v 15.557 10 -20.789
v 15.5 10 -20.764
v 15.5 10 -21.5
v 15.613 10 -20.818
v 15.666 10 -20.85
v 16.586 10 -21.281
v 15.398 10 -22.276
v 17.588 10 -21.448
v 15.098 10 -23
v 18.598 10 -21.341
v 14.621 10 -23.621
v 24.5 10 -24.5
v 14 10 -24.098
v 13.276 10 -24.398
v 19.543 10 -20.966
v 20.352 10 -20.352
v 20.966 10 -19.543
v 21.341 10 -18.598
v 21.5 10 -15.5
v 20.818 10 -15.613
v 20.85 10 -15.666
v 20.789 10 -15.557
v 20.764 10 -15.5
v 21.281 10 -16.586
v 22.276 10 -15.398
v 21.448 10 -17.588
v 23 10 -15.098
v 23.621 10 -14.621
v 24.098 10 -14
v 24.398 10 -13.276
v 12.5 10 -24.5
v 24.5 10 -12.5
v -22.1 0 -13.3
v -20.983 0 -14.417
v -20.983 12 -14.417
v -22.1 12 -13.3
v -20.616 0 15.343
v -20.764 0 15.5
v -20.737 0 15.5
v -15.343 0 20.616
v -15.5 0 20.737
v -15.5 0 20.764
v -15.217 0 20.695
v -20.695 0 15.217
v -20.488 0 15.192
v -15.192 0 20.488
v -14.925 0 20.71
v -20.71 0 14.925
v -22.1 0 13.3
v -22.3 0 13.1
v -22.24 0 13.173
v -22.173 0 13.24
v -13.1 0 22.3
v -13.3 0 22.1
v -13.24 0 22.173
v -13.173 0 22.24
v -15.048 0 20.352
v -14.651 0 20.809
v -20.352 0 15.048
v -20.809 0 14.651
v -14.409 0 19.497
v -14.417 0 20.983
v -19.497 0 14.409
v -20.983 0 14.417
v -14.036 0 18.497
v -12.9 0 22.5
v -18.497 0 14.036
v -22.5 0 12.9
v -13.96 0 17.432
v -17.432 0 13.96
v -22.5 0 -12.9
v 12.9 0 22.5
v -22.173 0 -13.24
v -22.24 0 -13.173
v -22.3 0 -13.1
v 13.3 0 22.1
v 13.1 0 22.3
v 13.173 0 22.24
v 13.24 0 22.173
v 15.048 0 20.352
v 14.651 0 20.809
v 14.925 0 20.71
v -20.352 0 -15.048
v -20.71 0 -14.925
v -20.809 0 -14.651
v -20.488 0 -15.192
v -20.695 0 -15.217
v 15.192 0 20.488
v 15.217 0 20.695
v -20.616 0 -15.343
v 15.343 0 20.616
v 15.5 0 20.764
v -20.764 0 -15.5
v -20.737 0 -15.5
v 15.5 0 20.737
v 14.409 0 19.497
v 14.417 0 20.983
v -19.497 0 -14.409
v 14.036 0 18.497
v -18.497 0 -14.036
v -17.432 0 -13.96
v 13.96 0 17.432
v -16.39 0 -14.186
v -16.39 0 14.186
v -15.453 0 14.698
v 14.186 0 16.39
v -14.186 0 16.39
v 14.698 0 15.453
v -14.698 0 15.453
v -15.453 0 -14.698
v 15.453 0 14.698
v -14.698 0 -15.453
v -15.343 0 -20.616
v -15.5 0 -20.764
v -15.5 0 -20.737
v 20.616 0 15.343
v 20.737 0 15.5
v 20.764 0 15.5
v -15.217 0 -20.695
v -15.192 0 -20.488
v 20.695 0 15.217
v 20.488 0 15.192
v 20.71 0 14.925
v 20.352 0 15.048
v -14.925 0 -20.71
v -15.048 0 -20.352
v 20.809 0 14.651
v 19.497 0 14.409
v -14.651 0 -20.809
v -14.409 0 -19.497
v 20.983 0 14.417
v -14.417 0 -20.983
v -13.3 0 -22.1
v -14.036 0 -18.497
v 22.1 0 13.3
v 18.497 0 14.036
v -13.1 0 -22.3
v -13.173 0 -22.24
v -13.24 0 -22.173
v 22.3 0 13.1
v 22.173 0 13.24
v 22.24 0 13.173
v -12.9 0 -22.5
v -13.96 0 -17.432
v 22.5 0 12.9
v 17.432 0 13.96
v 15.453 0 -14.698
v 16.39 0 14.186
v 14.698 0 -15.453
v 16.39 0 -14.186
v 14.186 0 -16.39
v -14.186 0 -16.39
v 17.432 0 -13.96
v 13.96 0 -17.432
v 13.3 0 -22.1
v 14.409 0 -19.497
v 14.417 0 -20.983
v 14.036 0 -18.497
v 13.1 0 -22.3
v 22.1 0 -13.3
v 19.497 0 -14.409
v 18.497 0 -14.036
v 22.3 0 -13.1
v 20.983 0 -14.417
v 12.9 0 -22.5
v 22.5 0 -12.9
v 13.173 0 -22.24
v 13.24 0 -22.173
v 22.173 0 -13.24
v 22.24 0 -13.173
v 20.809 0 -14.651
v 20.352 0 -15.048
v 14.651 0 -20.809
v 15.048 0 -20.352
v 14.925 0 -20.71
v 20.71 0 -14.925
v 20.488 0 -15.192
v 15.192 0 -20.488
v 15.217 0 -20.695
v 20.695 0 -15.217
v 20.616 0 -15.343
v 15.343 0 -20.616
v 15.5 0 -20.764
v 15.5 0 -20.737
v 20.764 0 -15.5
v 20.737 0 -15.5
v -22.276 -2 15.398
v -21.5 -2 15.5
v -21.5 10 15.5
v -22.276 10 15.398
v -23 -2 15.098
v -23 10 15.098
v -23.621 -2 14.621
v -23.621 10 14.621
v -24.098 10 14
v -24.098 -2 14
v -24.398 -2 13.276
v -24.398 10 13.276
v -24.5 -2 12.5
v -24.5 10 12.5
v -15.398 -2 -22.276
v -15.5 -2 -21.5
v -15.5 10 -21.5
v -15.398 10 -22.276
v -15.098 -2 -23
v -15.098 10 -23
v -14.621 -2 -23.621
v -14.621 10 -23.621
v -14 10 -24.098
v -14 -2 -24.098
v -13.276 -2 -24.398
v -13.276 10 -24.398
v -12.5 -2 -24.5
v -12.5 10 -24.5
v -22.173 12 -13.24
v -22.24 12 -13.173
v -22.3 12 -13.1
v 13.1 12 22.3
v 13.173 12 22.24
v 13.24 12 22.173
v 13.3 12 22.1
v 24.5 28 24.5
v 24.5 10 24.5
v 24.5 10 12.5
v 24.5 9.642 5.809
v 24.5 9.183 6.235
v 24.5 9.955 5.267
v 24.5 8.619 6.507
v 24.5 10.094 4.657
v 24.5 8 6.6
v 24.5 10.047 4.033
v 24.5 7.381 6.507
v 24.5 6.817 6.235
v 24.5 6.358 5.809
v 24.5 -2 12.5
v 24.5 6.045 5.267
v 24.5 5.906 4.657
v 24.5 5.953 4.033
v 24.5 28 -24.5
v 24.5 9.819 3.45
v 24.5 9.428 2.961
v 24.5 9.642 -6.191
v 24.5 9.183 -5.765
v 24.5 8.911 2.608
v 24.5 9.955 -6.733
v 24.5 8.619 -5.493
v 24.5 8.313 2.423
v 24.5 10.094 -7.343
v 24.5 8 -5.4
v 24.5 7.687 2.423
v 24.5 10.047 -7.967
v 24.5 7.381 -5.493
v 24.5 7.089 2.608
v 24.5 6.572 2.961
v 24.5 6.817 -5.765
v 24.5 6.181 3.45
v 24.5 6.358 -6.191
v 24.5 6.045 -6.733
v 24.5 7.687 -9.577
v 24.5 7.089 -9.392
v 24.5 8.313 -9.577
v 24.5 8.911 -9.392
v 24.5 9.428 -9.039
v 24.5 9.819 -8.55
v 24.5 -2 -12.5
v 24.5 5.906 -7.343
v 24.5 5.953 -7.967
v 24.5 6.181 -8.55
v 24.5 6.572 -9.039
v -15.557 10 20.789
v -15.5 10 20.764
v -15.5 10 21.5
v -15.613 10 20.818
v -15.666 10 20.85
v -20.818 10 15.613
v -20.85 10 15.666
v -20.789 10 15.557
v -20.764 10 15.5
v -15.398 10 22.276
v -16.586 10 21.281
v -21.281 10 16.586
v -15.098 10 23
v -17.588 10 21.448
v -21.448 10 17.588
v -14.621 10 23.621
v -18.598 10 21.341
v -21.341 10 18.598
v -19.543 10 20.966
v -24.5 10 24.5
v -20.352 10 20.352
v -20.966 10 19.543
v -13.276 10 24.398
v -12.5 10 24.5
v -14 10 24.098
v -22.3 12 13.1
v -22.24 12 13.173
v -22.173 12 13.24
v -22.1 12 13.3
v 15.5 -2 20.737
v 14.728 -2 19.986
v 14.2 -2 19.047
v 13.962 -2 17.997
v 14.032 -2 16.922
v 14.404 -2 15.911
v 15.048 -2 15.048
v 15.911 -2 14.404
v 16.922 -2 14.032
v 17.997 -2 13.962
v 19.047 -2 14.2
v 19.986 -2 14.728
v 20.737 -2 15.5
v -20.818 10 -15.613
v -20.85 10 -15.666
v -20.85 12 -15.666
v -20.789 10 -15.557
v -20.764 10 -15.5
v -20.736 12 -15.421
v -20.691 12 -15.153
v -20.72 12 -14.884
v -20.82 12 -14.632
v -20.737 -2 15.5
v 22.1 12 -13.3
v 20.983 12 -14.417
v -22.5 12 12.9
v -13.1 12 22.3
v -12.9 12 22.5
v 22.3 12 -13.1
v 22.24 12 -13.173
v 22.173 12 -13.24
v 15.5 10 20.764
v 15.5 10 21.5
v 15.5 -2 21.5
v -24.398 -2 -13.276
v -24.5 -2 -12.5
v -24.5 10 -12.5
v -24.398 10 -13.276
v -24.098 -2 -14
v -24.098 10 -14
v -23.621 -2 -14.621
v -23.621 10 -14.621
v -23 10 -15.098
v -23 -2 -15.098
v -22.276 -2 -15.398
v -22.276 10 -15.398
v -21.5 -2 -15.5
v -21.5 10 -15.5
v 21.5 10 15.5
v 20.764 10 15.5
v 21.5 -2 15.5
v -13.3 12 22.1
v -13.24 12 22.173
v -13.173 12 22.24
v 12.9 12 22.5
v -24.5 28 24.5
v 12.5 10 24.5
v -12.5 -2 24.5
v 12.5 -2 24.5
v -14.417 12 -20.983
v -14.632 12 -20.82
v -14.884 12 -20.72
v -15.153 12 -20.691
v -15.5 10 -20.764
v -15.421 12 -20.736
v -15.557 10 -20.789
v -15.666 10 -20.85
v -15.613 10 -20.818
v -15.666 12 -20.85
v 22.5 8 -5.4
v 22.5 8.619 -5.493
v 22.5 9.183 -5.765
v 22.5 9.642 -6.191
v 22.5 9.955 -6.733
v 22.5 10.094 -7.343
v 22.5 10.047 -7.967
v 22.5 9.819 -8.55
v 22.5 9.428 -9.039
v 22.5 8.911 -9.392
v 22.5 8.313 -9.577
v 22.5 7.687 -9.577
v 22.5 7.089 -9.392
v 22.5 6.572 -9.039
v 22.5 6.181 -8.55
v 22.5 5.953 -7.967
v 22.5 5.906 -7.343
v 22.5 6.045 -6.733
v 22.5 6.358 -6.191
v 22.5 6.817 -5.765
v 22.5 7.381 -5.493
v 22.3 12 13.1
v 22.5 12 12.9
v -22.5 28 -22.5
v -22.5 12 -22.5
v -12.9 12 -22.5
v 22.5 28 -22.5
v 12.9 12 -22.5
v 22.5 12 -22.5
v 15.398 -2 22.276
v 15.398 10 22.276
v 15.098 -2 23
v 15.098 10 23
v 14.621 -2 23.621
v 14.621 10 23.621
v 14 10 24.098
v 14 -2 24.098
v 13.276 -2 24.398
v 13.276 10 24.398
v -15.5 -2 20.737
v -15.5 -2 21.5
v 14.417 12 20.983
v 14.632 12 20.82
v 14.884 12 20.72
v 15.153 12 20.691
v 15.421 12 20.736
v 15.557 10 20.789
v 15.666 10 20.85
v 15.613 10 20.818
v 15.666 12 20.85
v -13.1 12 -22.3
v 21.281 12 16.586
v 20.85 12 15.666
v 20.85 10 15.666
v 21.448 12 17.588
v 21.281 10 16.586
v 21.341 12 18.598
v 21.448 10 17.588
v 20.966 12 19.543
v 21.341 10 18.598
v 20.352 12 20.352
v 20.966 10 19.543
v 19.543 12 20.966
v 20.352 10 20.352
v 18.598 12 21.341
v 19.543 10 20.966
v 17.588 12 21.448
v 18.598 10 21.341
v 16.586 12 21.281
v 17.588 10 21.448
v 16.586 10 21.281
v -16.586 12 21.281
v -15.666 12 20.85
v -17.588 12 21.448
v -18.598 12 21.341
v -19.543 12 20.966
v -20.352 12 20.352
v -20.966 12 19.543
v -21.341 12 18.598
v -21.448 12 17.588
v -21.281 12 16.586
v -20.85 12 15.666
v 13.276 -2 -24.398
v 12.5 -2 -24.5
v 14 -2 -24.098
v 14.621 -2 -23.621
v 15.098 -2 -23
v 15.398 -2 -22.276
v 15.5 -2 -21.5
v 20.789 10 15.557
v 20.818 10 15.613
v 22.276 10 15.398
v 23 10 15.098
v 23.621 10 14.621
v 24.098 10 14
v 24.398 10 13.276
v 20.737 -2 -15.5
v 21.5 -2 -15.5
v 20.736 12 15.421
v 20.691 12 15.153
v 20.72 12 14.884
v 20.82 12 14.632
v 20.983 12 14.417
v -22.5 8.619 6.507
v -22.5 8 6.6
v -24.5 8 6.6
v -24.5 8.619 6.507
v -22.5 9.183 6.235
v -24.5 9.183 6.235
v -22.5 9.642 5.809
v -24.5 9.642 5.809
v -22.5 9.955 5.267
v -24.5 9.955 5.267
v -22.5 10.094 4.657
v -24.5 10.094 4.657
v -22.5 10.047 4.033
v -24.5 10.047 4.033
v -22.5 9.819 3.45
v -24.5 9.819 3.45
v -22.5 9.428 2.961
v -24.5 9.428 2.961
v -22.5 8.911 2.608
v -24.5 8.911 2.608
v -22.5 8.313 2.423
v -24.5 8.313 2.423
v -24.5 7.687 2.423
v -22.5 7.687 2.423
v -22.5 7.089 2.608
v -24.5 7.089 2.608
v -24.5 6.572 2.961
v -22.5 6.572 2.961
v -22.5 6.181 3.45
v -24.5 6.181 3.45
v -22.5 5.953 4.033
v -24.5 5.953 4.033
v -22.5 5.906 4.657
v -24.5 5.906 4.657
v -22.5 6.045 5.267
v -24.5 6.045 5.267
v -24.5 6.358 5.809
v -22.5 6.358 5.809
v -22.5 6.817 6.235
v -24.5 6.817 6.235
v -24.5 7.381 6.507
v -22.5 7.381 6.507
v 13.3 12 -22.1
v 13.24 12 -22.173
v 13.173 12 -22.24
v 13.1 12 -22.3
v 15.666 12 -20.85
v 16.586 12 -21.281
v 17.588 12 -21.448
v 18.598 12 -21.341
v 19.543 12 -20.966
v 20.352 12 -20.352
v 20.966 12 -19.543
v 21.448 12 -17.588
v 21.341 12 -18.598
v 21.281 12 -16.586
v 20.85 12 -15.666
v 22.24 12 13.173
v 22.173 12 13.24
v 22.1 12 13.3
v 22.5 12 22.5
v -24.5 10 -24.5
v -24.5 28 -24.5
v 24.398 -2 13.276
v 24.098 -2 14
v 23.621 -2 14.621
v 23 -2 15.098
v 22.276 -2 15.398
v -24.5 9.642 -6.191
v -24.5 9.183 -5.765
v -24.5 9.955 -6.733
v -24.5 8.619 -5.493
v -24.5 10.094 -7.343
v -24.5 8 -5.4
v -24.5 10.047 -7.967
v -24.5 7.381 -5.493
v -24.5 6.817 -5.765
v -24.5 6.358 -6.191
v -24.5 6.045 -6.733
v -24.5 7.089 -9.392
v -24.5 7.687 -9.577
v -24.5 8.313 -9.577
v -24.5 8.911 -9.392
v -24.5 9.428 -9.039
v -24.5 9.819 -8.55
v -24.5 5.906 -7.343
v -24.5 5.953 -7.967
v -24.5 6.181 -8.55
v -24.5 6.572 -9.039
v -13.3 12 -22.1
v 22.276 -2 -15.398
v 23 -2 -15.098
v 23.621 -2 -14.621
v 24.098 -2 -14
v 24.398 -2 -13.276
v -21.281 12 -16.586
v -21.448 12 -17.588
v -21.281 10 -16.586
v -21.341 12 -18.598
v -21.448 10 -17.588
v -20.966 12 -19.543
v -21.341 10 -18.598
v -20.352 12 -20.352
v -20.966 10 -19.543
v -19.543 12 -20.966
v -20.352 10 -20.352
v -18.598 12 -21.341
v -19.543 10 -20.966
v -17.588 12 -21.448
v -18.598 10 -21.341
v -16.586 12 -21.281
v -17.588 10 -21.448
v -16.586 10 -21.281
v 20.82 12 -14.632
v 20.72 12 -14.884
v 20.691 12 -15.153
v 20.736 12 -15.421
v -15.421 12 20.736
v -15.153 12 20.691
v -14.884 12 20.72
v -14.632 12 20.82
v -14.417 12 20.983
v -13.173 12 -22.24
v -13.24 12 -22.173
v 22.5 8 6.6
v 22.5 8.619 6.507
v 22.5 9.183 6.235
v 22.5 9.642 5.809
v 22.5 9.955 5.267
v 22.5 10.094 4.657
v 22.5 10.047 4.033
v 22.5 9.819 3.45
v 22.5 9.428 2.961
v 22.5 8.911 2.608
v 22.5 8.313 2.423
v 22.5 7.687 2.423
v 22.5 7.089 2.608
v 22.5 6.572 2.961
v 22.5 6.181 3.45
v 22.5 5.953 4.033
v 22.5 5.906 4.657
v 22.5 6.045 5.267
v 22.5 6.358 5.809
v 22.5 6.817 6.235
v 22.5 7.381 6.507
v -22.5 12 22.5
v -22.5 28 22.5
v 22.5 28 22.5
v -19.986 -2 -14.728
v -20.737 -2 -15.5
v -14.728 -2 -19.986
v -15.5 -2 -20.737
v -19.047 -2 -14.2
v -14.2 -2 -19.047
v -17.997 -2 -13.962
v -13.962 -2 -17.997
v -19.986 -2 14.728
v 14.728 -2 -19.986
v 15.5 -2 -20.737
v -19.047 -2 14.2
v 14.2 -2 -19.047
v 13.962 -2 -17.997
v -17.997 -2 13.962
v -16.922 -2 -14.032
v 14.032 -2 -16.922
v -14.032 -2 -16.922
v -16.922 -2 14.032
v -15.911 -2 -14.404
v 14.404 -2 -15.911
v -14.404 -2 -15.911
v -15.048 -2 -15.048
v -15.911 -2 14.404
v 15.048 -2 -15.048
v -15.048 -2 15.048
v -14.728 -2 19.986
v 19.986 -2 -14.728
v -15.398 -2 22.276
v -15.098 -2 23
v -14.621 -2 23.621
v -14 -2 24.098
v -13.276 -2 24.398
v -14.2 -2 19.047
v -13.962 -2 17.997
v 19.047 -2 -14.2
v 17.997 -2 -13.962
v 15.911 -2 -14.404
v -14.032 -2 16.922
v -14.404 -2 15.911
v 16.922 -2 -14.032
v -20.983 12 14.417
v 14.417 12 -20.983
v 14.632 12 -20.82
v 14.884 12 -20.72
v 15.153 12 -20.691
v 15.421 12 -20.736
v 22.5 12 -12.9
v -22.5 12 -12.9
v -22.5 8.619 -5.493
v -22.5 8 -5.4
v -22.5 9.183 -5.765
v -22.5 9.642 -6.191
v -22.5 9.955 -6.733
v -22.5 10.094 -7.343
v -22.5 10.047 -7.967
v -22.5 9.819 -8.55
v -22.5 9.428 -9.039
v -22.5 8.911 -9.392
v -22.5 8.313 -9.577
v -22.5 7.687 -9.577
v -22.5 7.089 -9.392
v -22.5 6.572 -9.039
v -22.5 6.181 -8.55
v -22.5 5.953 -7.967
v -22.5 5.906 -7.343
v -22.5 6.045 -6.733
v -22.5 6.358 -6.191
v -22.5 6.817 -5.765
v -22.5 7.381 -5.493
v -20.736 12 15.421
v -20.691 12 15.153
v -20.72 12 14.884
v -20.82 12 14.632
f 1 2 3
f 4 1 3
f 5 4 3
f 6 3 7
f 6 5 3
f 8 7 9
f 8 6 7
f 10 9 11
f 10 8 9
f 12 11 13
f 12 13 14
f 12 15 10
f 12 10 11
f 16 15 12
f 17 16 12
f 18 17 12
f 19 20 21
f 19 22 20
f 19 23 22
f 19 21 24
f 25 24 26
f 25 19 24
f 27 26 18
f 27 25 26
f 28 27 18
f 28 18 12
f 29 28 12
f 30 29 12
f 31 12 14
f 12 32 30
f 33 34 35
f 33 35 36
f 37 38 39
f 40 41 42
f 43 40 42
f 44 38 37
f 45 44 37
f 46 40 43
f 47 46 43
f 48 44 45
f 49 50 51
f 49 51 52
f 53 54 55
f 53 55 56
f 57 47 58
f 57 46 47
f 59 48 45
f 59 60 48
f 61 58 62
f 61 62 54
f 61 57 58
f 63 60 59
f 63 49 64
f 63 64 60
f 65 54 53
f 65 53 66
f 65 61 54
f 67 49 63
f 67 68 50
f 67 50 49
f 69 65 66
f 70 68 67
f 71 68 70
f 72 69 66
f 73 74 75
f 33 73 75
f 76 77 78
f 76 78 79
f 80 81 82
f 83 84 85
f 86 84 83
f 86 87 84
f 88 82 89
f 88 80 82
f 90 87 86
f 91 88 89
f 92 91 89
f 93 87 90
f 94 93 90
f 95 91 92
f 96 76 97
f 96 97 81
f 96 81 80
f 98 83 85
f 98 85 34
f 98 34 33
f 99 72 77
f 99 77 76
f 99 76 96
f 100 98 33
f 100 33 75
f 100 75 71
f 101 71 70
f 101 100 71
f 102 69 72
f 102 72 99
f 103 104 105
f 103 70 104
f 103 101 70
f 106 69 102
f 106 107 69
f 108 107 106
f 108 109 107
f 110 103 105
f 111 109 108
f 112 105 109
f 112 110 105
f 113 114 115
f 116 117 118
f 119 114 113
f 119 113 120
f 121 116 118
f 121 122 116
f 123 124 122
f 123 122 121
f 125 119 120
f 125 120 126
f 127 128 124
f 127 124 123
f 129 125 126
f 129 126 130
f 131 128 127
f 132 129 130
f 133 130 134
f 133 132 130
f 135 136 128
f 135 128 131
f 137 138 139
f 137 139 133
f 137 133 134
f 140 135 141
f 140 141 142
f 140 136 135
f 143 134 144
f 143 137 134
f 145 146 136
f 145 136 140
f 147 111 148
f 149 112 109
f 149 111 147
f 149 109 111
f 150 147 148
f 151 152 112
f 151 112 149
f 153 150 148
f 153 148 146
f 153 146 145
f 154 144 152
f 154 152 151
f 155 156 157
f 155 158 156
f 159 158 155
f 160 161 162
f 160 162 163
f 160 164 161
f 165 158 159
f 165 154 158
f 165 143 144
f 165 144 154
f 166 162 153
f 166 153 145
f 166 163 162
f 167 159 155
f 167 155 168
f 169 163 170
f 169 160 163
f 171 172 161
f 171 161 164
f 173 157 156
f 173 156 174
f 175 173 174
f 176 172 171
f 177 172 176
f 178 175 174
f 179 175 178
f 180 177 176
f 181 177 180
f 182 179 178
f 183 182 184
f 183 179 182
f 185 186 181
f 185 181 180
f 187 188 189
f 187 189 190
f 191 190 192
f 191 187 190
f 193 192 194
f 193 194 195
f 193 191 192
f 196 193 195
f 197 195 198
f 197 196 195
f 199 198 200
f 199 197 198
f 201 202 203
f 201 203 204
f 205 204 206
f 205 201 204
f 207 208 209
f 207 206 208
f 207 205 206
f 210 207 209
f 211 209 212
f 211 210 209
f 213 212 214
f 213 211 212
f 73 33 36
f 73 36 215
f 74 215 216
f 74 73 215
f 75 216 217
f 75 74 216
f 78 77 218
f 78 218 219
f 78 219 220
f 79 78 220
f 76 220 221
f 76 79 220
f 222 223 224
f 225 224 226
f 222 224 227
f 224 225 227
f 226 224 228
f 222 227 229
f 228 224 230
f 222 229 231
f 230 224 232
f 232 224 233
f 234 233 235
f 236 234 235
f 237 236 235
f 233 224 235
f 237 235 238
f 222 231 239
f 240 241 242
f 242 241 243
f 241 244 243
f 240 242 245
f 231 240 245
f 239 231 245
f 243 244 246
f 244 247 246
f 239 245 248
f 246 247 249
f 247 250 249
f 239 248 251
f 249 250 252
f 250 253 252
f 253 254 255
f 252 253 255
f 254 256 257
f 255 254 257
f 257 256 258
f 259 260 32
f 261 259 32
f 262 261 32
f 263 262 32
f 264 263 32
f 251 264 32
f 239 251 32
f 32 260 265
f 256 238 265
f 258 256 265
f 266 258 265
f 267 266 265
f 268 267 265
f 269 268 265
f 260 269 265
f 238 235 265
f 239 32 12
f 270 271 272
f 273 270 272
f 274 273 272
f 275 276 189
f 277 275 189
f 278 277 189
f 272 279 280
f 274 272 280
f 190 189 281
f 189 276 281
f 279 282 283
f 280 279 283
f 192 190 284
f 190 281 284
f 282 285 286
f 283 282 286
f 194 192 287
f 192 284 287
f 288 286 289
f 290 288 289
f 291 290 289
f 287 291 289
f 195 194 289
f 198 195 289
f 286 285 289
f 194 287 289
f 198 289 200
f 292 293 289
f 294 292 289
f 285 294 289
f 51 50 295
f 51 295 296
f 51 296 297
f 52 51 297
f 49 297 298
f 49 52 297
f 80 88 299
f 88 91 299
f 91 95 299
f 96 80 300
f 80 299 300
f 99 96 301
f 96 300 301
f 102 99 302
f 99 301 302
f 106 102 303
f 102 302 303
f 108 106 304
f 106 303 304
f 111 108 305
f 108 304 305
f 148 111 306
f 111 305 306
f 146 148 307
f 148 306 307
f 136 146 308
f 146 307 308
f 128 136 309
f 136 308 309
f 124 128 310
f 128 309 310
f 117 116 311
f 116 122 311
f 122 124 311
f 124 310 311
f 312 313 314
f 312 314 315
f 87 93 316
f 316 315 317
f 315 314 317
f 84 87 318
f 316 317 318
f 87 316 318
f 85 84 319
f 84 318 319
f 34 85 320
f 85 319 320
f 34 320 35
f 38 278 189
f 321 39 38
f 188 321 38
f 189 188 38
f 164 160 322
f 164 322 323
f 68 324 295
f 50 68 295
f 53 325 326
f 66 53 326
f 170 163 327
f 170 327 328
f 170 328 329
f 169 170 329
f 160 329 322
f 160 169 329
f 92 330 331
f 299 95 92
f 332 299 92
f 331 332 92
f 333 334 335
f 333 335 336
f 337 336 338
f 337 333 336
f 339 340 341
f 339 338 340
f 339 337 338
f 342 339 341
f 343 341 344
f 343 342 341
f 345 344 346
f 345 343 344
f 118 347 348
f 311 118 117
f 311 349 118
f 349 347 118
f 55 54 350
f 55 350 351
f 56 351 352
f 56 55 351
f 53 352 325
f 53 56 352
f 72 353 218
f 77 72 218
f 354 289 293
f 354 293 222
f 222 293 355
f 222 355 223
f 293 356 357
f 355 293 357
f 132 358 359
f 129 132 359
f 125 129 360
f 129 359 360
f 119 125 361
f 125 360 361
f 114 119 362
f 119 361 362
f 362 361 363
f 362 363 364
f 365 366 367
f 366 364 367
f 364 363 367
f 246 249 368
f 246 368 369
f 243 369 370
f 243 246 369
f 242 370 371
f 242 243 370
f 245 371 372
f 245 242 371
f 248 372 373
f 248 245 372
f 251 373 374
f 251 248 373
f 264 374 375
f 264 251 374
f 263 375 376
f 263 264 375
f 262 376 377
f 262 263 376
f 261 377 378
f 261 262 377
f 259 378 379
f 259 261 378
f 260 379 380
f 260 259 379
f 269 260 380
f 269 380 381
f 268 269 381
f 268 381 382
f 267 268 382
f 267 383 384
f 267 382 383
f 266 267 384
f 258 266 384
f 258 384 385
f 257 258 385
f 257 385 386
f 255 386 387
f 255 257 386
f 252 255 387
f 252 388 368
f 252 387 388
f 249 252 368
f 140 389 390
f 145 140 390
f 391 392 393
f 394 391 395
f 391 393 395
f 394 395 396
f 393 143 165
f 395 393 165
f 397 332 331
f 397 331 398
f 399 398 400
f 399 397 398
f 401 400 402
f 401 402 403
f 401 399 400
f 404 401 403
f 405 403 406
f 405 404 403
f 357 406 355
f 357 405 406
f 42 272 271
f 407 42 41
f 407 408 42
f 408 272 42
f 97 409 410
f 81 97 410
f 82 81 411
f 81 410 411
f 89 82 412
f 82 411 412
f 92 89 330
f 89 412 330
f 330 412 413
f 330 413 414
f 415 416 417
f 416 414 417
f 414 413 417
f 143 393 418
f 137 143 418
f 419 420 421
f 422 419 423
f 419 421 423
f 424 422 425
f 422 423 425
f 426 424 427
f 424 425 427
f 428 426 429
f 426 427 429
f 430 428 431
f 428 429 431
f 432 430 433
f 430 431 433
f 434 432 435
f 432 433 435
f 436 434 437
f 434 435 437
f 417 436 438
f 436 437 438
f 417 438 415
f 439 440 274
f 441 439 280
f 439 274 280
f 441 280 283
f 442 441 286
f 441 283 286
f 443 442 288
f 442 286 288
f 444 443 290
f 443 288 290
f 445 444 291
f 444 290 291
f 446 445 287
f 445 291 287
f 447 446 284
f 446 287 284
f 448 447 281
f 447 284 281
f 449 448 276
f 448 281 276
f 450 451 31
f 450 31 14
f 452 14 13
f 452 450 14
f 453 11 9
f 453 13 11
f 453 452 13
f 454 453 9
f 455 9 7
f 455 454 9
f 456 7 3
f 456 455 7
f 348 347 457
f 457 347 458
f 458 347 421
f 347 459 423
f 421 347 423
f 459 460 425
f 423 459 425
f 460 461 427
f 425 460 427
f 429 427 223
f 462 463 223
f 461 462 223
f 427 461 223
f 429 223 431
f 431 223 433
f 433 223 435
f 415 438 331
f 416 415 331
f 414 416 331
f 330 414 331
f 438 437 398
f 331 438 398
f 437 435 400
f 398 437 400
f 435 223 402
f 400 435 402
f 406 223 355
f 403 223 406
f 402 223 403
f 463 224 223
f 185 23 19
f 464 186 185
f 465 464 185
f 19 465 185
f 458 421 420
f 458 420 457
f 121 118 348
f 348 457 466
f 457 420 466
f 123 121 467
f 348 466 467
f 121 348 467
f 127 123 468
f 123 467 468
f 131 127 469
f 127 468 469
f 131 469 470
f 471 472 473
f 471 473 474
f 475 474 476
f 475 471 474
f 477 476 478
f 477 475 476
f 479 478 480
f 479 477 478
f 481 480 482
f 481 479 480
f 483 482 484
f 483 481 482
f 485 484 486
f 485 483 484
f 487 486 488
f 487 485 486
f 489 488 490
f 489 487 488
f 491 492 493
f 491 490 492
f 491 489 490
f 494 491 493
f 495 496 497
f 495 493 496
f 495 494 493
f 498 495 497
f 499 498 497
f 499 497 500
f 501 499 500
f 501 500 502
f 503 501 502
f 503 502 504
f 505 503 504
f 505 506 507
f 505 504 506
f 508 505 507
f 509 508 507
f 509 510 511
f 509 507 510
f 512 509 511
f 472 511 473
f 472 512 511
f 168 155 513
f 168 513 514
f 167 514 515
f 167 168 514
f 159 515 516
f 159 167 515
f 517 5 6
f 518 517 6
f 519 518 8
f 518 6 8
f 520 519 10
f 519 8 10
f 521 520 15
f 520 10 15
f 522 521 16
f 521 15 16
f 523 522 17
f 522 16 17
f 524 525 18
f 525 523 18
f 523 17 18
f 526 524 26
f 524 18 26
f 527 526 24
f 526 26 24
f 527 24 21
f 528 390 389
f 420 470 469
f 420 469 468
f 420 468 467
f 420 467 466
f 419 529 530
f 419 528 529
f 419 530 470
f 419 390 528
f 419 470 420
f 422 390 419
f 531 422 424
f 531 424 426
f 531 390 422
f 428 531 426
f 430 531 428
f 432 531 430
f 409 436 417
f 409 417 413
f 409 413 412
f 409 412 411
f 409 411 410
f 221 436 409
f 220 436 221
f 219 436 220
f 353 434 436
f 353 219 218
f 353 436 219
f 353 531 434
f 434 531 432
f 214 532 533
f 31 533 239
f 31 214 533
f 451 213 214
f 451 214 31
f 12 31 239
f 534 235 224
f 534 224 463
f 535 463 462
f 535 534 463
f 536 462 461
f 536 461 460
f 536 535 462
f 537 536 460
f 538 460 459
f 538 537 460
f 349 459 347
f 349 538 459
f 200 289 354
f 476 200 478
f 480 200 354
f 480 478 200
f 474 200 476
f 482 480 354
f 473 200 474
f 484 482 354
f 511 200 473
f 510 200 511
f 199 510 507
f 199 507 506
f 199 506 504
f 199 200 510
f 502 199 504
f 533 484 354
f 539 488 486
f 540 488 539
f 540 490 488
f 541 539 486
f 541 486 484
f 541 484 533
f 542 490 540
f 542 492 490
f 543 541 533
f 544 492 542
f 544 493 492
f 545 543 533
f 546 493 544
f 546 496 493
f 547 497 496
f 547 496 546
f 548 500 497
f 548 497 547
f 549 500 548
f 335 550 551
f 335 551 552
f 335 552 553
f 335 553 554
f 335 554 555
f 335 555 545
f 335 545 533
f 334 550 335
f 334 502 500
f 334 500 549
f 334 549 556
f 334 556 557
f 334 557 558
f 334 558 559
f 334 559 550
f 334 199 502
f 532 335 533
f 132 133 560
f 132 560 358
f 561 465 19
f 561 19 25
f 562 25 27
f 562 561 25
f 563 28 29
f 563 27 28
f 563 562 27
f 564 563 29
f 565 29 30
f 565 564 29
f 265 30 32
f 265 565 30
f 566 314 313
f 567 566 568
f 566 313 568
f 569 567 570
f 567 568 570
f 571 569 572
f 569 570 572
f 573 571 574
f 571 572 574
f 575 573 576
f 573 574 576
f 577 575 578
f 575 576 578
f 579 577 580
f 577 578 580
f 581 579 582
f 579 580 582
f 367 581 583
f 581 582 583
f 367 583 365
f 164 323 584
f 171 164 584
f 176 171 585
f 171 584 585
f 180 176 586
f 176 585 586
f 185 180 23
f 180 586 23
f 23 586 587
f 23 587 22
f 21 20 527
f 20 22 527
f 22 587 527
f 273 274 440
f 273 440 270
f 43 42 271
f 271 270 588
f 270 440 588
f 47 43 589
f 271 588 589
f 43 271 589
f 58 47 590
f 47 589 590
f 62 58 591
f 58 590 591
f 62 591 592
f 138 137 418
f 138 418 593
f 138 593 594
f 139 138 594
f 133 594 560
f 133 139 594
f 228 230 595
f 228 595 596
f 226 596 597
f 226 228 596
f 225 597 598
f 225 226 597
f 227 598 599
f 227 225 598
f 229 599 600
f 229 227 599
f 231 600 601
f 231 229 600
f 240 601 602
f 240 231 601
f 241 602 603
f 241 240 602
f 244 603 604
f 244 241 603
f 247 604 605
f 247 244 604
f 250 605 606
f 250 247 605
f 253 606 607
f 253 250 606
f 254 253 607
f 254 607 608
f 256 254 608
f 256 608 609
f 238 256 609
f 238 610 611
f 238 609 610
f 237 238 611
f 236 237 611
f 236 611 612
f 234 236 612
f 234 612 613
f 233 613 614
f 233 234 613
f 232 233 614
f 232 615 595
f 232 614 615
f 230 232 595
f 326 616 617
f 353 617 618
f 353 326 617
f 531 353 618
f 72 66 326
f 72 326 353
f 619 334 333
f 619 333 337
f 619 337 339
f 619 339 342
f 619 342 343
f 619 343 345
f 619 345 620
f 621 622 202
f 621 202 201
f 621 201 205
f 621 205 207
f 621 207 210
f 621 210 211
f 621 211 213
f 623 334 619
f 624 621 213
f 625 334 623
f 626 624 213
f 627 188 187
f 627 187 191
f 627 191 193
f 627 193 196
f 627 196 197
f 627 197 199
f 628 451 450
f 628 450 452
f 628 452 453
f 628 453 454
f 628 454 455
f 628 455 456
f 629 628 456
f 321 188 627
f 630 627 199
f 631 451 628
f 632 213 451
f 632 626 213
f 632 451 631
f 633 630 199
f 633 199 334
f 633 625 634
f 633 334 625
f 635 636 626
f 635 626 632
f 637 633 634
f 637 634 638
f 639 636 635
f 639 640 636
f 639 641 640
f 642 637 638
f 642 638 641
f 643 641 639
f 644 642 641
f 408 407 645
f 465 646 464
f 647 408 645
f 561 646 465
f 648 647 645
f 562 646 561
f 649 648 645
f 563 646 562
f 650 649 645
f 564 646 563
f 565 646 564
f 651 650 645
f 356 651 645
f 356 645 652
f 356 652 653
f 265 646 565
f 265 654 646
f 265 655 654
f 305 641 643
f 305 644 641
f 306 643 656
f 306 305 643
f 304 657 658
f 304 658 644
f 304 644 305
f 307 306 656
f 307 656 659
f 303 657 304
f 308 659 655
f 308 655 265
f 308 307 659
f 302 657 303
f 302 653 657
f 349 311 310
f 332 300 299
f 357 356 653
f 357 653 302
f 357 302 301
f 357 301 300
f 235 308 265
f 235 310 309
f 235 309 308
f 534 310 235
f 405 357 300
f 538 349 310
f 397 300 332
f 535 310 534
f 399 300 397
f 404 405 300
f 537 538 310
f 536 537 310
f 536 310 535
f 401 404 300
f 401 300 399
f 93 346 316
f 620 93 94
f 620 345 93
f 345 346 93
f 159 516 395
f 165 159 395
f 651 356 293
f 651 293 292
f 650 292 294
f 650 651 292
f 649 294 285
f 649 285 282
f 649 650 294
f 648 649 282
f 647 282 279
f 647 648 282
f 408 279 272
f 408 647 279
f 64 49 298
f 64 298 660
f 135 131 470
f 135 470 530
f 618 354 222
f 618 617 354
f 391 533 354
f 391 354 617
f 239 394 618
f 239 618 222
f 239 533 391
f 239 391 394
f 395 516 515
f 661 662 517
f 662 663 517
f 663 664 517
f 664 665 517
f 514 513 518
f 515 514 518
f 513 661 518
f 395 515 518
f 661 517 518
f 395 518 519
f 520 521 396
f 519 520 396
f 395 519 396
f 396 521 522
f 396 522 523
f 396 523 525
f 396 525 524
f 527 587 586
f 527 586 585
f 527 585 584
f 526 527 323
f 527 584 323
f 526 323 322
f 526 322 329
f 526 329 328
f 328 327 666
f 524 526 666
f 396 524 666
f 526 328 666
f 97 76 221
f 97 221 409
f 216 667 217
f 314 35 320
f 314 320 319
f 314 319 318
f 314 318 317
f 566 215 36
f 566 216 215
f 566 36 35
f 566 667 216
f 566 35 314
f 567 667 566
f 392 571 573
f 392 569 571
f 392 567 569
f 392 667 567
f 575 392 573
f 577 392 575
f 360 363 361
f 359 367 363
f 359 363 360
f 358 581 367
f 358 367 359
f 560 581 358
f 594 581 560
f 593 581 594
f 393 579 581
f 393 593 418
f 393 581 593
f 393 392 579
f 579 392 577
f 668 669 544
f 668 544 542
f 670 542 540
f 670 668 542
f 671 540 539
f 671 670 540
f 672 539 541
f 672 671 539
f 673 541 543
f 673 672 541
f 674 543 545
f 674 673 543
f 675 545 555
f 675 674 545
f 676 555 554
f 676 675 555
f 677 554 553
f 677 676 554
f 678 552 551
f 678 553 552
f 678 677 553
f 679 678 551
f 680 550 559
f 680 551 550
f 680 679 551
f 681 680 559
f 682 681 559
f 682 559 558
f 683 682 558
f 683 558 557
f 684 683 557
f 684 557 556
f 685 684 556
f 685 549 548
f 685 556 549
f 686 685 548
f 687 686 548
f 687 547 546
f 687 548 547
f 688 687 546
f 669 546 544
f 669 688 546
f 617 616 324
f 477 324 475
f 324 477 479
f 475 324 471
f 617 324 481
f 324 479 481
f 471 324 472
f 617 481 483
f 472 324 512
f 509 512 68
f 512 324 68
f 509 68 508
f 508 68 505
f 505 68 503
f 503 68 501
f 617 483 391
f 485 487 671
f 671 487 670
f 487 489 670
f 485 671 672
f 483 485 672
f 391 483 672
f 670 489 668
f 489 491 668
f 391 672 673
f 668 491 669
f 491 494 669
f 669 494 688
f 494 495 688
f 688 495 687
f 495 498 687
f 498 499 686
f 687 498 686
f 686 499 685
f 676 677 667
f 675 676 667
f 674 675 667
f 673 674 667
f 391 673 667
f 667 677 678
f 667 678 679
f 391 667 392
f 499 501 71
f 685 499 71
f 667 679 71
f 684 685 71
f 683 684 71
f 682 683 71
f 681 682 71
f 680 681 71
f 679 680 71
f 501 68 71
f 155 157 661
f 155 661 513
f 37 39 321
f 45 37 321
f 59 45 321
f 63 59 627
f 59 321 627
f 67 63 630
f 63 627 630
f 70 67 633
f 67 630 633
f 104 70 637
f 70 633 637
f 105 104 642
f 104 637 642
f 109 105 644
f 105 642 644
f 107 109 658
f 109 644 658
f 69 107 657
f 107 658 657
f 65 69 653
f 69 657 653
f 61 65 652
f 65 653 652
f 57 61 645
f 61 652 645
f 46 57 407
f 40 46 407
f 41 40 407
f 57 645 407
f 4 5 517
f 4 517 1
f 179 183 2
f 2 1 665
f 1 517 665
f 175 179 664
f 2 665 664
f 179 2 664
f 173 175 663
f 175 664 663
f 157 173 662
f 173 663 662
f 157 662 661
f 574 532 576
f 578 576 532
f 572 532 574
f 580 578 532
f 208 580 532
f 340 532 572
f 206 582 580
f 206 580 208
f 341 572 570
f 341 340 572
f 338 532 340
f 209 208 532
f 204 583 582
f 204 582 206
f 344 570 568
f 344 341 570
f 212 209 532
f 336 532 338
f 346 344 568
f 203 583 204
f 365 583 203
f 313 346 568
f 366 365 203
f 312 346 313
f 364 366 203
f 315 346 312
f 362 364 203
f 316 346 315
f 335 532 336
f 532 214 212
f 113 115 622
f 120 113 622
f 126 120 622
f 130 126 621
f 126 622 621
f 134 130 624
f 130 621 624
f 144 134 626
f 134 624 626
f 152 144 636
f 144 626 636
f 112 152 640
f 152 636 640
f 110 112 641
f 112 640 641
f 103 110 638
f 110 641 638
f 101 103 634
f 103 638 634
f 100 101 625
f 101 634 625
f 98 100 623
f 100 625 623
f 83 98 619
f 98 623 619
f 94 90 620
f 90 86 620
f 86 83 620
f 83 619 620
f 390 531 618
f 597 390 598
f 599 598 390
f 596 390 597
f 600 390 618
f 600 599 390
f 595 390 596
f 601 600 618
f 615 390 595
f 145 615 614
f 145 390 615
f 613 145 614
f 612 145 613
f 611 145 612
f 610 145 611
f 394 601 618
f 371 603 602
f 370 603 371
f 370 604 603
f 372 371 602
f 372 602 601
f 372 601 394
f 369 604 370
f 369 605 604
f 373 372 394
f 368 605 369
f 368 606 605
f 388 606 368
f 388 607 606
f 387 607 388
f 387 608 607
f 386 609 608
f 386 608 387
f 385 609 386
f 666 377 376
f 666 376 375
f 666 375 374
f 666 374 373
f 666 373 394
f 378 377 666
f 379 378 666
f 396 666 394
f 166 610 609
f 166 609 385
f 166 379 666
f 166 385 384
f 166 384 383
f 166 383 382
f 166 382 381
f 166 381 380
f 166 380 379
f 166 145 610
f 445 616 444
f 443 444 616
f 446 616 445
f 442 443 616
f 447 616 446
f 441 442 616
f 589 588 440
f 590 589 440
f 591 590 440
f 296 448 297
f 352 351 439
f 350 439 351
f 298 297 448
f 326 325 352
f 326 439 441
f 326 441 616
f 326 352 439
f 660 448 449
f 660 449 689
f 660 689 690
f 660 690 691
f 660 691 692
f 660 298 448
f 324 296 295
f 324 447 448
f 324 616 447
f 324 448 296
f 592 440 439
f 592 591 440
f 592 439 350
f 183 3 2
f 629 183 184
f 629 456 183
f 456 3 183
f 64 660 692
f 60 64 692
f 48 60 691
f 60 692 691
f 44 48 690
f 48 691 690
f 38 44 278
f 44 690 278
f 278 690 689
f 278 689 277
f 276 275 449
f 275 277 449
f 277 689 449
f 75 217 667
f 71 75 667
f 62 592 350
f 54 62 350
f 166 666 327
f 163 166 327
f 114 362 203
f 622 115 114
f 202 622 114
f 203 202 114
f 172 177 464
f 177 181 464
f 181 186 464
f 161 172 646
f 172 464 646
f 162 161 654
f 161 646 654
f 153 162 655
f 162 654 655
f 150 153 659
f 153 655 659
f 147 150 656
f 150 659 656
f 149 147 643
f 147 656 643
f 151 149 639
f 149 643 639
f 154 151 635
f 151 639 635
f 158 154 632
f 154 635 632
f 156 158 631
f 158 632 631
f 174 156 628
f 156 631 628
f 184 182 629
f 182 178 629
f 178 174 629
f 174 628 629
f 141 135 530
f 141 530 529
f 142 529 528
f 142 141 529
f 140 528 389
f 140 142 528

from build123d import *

# Parameters (mm, degrees)
EXTRUDE_1_DEPTH          = 12
EXTRUDE_START            = 2
EXTRUDE_2_DEPTH          = 2
SKETCH_2_W               = 49
SKETCH_2_H               = 49
SKETCH_2_W_2             = 45
SKETCH_2_H_2             = 45
EXTRUDE_3_DEPTH          = 16
EXTRUDE_4_DEPTH          = 2
SKETCH_5_R               = 2.25
CUT_EXTRUDE_2_DEPTH      = 46.831212072
SKETCH_7_R               = 3.75
CUT_EXTRUDE_3_DEPTH      = 46.831212072
CUT_EXTRUDE_4_DEPTH      = 60.943723608
CUT_EXTRUDE_4_DEPTH_BACK = 60.943723608
SKETCH_8_R               = 2.1
CUT_EXTRUDE_10_DEPTH     = 12
FILLET_2_R               = 1


with BuildPart() as part:
    # 草图3 → 凸台-拉伸1 (new body)
    with BuildSketch(Plane(origin=(0, 0, 0), x_dir=(-1, 0, 0), z_dir=(0, -1, 0))):
        with BuildLine():
            Line((18.5, 15.5), (21.5, 15.5))
            ThreePointArc((21.5, 15.5), (23.621320344, 14.621320344), (24.5, 12.5))
            Line((24.5, 12.5), (24.5, -12.5))
            ThreePointArc((24.5, -12.5), (23.621320344, -14.621320344), (21.5, -15.5))
            Line((21.5, -15.5), (18.5, -15.5))
            ThreePointArc((18.5, -15.5), (16.378679656, -16.378679656), (15.5, -18.5))
            Line((15.5, -18.5), (15.5, -21.5))
            ThreePointArc((15.5, -21.5), (14.621320344, -23.621320344), (12.5, -24.5))
            Line((12.5, -24.5), (-12.5, -24.5))
            ThreePointArc((-12.5, -24.5), (-14.621320344, -23.621320344), (-15.5, -21.5))
            Line((-15.5, -21.5), (-15.5, -18.5))
            ThreePointArc((-15.5, -18.5), (-16.378679656, -16.378679656), (-18.5, -15.5))
            Line((-18.5, -15.5), (-21.5, -15.5))
            ThreePointArc((-21.5, -15.5), (-23.621320344, -14.621320344), (-24.5, -12.5))
            Line((-24.5, -12.5), (-24.5, 12.5))
            ThreePointArc((-24.5, 12.5), (-23.621320344, 14.621320344), (-21.5, 15.5))
            Line((-21.5, 15.5), (-18.5, 15.5))
            ThreePointArc((-18.5, 15.5), (-16.378679656, 16.378679656), (-15.5, 18.5))
            Line((-15.5, 18.5), (-15.5, 21.5))
            ThreePointArc((-15.5, 21.5), (-14.621320344, 23.621320344), (-12.5, 24.5))
            Line((-12.5, 24.5), (12.5, 24.5))
            ThreePointArc((12.5, 24.5), (14.621320344, 23.621320344), (15.5, 21.5))
            Line((15.5, 21.5), (15.5, 18.5))
            ThreePointArc((15.5, 18.5), (16.378679656, 16.378679656), (18.5, 15.5))
        make_face()
        with BuildLine():
            Line((18.5, 13.5), (21.5, 13.5))
            ThreePointArc((21.5, 13.5), (22.207106781, 13.207106781), (22.5, 12.5))
            Line((22.5, 12.5), (22.5, -12.5))
            ThreePointArc((22.5, -12.5), (22.207106781, -13.207106781), (21.5, -13.5))
            Line((21.5, -13.5), (18.5, -13.5))
            ThreePointArc((18.5, -13.5), (14.964466094, -14.964466094), (13.5, -18.5))
            Line((13.5, -18.5), (13.5, -21.5))
            ThreePointArc((13.5, -21.5), (13.207106781, -22.207106781), (12.5, -22.5))
            Line((12.5, -22.5), (-12.5, -22.5))
            ThreePointArc((-12.5, -22.5), (-13.207106781, -22.207106781), (-13.5, -21.5))
            Line((-13.5, -21.5), (-13.5, -18.5))
            ThreePointArc((-13.5, -18.5), (-14.964466094, -14.964466094), (-18.5, -13.5))
            Line((-18.5, -13.5), (-21.5, -13.5))
            ThreePointArc((-21.5, -13.5), (-22.207106781, -13.207106781), (-22.5, -12.5))
            Line((-22.5, -12.5), (-22.5, 12.5))
            ThreePointArc((-22.5, 12.5), (-22.207106781, 13.207106781), (-21.5, 13.5))
            Line((-21.5, 13.5), (-18.5, 13.5))
            ThreePointArc((-18.5, 13.5), (-14.964466094, 14.964466094), (-13.5, 18.5))
            Line((-13.5, 18.5), (-13.5, 21.5))
            ThreePointArc((-13.5, 21.5), (-13.207106781, 22.207106781), (-12.5, 22.5))
            Line((-12.5, 22.5), (12.5, 22.5))
            ThreePointArc((12.5, 22.5), (13.207106781, 22.207106781), (13.5, 21.5))
            Line((13.5, 21.5), (13.5, 18.5))
            ThreePointArc((13.5, 18.5), (14.964466094, 14.964466094), (18.5, 13.5))
        make_face(mode=Mode.SUBTRACT)
    extrude(amount=-EXTRUDE_1_DEPTH)

    # 草图4 → 凸台-拉伸2 (add)
    with BuildSketch(Plane.XZ.offset(EXTRUDE_START)):
        with BuildLine():
            Line((-24.5, 12.5), (-24.5, -12.5))
            ThreePointArc((-24.5, -12.5), (-23.621320344, -14.621320344), (-21.5, -15.5))
            Line((-21.5, -15.5), (-18.5, -15.5))
            ThreePointArc((-18.5, -15.5), (-16.378679656, -16.378679656), (-15.5, -18.5))
            Line((-15.5, -18.5), (-15.5, -21.5))
            ThreePointArc((-15.5, -21.5), (-14.621320344, -23.621320344), (-12.5, -24.5))
            Line((-12.5, -24.5), (12.5, -24.5))
            ThreePointArc((12.5, -24.5), (14.621320344, -23.621320344), (15.5, -21.5))
            Line((15.5, -21.5), (15.5, -18.5))
            ThreePointArc((15.5, -18.5), (16.378679656, -16.378679656), (18.5, -15.5))
            Line((18.5, -15.5), (21.5, -15.5))
            ThreePointArc((21.5, -15.5), (23.621320344, -14.621320344), (24.5, -12.5))
            Line((24.5, -12.5), (24.5, 12.5))
            ThreePointArc((24.5, 12.5), (23.621320344, 14.621320344), (21.5, 15.5))
            Line((21.5, 15.5), (18.5, 15.5))
            ThreePointArc((18.5, 15.5), (16.378679656, 16.378679656), (15.5, 18.5))
            Line((15.5, 18.5), (15.5, 21.5))
            ThreePointArc((15.5, 21.5), (14.621320344, 23.621320344), (12.5, 24.5))
            Line((12.5, 24.5), (-12.5, 24.5))
            ThreePointArc((-12.5, 24.5), (-14.621320344, 23.621320344), (-15.5, 21.5))
            Line((-15.5, 21.5), (-15.5, 18.5))
            ThreePointArc((-15.5, 18.5), (-16.378679656, 16.378679656), (-18.5, 15.5))
            Line((-18.5, 15.5), (-21.5, 15.5))
            ThreePointArc((-21.5, 15.5), (-23.621320344, 14.621320344), (-24.5, 12.5))
        make_face()
    extrude(amount=-EXTRUDE_2_DEPTH)

    # 草图2 → 凸台-拉伸3 (add)
    with BuildSketch(Plane(origin=(0, 12, 0), x_dir=(1, 0, 0), z_dir=(0, 1, 0))):
        Rectangle(SKETCH_2_W, SKETCH_2_H)
        Rectangle(SKETCH_2_W_2, SKETCH_2_H_2, mode=Mode.SUBTRACT)
    extrude(amount=EXTRUDE_3_DEPTH)

    # 草图6 → 凸台-拉伸4 (add)
    with BuildSketch(Plane.XZ.offset(-12).offset(EXTRUDE_START)):
        with BuildLine():
            Line((12.5, 24.5), (24.5, 24.5))
            Line((24.5, 24.5), (24.5, 12.5))
            ThreePointArc((24.5, 12.5), (23.621320344, 14.621320344), (21.5, 15.5))
            Line((21.5, 15.5), (18.5, 15.5))
            ThreePointArc((18.5, 15.5), (16.378679656, 16.378679656), (15.5, 18.5))
            Line((15.5, 18.5), (15.5, 21.5))
            ThreePointArc((15.5, 21.5), (14.621320344, 23.621320344), (12.5, 24.5))
        make_face()
        with BuildLine():
            Line((-24.5, -12.5), (-24.5, -24.5))
            Line((-24.5, -24.5), (-12.5, -24.5))
            ThreePointArc((-12.5, -24.5), (-14.621320344, -23.621320344), (-15.5, -21.5))
            Line((-15.5, -21.5), (-15.5, -18.5))
            ThreePointArc((-15.5, -18.5), (-16.378679656, -16.378679656), (-18.5, -15.5))
            Line((-18.5, -15.5), (-21.5, -15.5))
            ThreePointArc((-21.5, -15.5), (-23.621320344, -14.621320344), (-24.5, -12.5))
        make_face()
        with BuildLine():
            Line((-24.5, 12.5), (-24.5, 24.5))
            Line((-24.5, 24.5), (-12.5, 24.5))
            ThreePointArc((-12.5, 24.5), (-14.621320344, 23.621320344), (-15.5, 21.5))
            Line((-15.5, 21.5), (-15.5, 18.5))
            ThreePointArc((-15.5, 18.5), (-16.378679656, 16.378679656), (-18.5, 15.5))
            Line((-18.5, 15.5), (-21.5, 15.5))
            ThreePointArc((-21.5, 15.5), (-23.621320344, 14.621320344), (-24.5, 12.5))
        make_face()
        with BuildLine():
            Line((12.5, -24.5), (24.5, -24.5))
            Line((24.5, -24.5), (24.5, -12.5))
            ThreePointArc((24.5, -12.5), (23.621320344, -14.621320344), (21.5, -15.5))
            Line((21.5, -15.5), (18.5, -15.5))
            ThreePointArc((18.5, -15.5), (16.378679656, -16.378679656), (15.5, -18.5))
            Line((15.5, -18.5), (15.5, -21.5))
            ThreePointArc((15.5, -21.5), (14.621320344, -23.621320344), (12.5, -24.5))
        make_face()
    extrude(amount=-EXTRUDE_4_DEPTH)

    # 草图5 → 切除-拉伸2 (cut, through all)
    with BuildSketch(Plane.XZ.offset(2)):
        with Locations(Location((-17.7, 17.7, 0), (0, 0, 270))):
            Circle(SKETCH_5_R)
        with Locations(Location((-17.7, -17.7, 0), (0, 0, 270))):
            Circle(SKETCH_5_R)
        with Locations(Location((17.7, 17.7, 0), (0, 0, 270))):
            Circle(SKETCH_5_R)
        with Locations(Location((17.7, -17.7, 0), (0, 0, 270))):
            Circle(SKETCH_5_R)
    extrude(amount=-CUT_EXTRUDE_2_DEPTH, mode=Mode.SUBTRACT)

    # 草图7 → 切除-拉伸3 (cut, through all)
    with BuildSketch(Plane.XZ.offset(2)):
        with Locations(Location((-17.7, 17.7, 0), (0, 0, 270))):
            Circle(SKETCH_7_R)
        with Locations(Location((-17.7, -17.7, 0), (0, 0, 270))):
            Circle(SKETCH_7_R)
        with Locations(Location((17.7, -17.7, 0), (0, 0, 270))):
            Circle(SKETCH_7_R)
        with Locations(Location((17.7, 17.7, 0), (0, 0, 270))):
            Circle(SKETCH_7_R)
    extrude(amount=-CUT_EXTRUDE_3_DEPTH, mode=Mode.SUBTRACT)

    # 草图8 → 切除-拉伸4 (cut, two sides: drawn at the far end of the back side and taken through both)
    with BuildSketch(Plane.ZY.offset(-22.5).offset(-CUT_EXTRUDE_4_DEPTH_BACK)):
        with Locations((-7.5, 8)):
            Circle(SKETCH_8_R)
        with Locations((4.5, 8)):
            Circle(SKETCH_8_R)
    extrude(amount=CUT_EXTRUDE_4_DEPTH + CUT_EXTRUDE_4_DEPTH_BACK, mode=Mode.SUBTRACT)

    # 草图15 → 切除-拉伸10 (cut)
    with BuildSketch(Plane(origin=(0, 12, 0), x_dir=(1, 0, 0), z_dir=(0, 1, 0))):
        Polygon((-22.5, 12.9), (-22.5, -12.9), (-17.7, -17.7), (-12.9, -22.5), (12.9, -22.5), (17.7, -17.7), (22.5, -12.9), (22.5, 12.9), (17.7, 17.7), (12.9, 22.5), (-12.9, 22.5), (-17.7, 17.7), align=None)
    extrude(amount=-CUT_EXTRUDE_10_DEPTH, mode=Mode.SUBTRACT)

    # 圆角2
    # the kernel refuses this fillet: 1 mm, written as the material it takes off along each edge
    with BuildSketch(Plane(origin=(-15.048349571, 14.233859763, 20.351650429), x_dir=(-0.7779866052155301, 0, 0.6282808624375049), z_dir=(0, -1, 0))) as fillet_2_piece_1:
        with BuildLine():
            CenterArc((0.89979254, -0.994381263), FILLET_2_R, 96.076598735, 77.846802531)
            Line((-0.094588722, -0.888523317), (0, 0))
            ThreePointArc((0, 0), (0.396967297, -0.021070265), (0.793934594, 0))
        make_face()
    extrude(amount=14.233859763, mode=Mode.SUBTRACT)
    with BuildSketch(Plane(origin=(-20.351650429, 14.233859763, 15.048349571), x_dir=(-0.7071067811865058, 0, -0.7071067811865893), z_dir=(0, -1, 0)), Plane(origin=(-15.048349571, 14.233859763, -20.351650429), x_dir=(0.7071067811865506, 0, -0.7071067811865446), z_dir=(0, -1, 0))) as fillet_2_piece_2:
        with BuildLine():
            CenterArc((0.893543905, -1), FILLET_2_R, 90, 77.846802531)
            ThreePointArc((-0.084044285, -0.789473684), (-0.021070265, -0.396967297), (0, 0))
            Line((0, 0), (0.893543905, 0))
        make_face()
    extrude(amount=14.233859763, mode=Mode.SUBTRACT)
    with BuildSketch(Plane(origin=(20.351650429, 14.233859763, 15.048349571), x_dir=(0.7071067811864988, 0, -0.7071067811865962), z_dir=(0, -1, 0)), Plane(origin=(-20.351650429, 14.233859763, -15.048349571), x_dir=(-0.7071067811865525, 0, 0.7071067811865426), z_dir=(0, -1, 0)), Plane(origin=(15.048349571, 14.233859763, -20.351650429), x_dir=(-0.7071067811865416, 0, -0.7071067811865536), z_dir=(0, -1, 0))) as fillet_2_piece_3:
        with BuildLine():
            CenterArc((0.893543905, 1), FILLET_2_R, 192.153197469, 77.846802531)
            ThreePointArc((-0.084044285, 0.789473684), (-0.021070265, 0.396967297), (0, 0))
            Line((0, 0), (0.893543905, 0))
        make_face()
    extrude(amount=14.233859763, mode=Mode.SUBTRACT)
    with BuildSketch(Plane(origin=(15.048349571, 14.233859763, 20.351650429), x_dir=(0.7779866052154646, 0, 0.6282808624375861), z_dir=(0, -1, 0)), Plane(origin=(20.351650429, 14.233859763, -15.048349571), x_dir=(0.628280862437575, 0, -0.7779866052154735), z_dir=(0, -1, 0))) as fillet_2_piece_4:
        with BuildLine():
            CenterArc((0.89979254, 0.994381263), FILLET_2_R, 186.076598734, 77.846802531)
            Line((-0.094588722, 0.888523317), (0, 0))
            ThreePointArc((0, 0), (0.396967297, 0.021070265), (0.793934594, 0))
        make_face()
    extrude(amount=14.233859763, mode=Mode.SUBTRACT)


solid = part.part
